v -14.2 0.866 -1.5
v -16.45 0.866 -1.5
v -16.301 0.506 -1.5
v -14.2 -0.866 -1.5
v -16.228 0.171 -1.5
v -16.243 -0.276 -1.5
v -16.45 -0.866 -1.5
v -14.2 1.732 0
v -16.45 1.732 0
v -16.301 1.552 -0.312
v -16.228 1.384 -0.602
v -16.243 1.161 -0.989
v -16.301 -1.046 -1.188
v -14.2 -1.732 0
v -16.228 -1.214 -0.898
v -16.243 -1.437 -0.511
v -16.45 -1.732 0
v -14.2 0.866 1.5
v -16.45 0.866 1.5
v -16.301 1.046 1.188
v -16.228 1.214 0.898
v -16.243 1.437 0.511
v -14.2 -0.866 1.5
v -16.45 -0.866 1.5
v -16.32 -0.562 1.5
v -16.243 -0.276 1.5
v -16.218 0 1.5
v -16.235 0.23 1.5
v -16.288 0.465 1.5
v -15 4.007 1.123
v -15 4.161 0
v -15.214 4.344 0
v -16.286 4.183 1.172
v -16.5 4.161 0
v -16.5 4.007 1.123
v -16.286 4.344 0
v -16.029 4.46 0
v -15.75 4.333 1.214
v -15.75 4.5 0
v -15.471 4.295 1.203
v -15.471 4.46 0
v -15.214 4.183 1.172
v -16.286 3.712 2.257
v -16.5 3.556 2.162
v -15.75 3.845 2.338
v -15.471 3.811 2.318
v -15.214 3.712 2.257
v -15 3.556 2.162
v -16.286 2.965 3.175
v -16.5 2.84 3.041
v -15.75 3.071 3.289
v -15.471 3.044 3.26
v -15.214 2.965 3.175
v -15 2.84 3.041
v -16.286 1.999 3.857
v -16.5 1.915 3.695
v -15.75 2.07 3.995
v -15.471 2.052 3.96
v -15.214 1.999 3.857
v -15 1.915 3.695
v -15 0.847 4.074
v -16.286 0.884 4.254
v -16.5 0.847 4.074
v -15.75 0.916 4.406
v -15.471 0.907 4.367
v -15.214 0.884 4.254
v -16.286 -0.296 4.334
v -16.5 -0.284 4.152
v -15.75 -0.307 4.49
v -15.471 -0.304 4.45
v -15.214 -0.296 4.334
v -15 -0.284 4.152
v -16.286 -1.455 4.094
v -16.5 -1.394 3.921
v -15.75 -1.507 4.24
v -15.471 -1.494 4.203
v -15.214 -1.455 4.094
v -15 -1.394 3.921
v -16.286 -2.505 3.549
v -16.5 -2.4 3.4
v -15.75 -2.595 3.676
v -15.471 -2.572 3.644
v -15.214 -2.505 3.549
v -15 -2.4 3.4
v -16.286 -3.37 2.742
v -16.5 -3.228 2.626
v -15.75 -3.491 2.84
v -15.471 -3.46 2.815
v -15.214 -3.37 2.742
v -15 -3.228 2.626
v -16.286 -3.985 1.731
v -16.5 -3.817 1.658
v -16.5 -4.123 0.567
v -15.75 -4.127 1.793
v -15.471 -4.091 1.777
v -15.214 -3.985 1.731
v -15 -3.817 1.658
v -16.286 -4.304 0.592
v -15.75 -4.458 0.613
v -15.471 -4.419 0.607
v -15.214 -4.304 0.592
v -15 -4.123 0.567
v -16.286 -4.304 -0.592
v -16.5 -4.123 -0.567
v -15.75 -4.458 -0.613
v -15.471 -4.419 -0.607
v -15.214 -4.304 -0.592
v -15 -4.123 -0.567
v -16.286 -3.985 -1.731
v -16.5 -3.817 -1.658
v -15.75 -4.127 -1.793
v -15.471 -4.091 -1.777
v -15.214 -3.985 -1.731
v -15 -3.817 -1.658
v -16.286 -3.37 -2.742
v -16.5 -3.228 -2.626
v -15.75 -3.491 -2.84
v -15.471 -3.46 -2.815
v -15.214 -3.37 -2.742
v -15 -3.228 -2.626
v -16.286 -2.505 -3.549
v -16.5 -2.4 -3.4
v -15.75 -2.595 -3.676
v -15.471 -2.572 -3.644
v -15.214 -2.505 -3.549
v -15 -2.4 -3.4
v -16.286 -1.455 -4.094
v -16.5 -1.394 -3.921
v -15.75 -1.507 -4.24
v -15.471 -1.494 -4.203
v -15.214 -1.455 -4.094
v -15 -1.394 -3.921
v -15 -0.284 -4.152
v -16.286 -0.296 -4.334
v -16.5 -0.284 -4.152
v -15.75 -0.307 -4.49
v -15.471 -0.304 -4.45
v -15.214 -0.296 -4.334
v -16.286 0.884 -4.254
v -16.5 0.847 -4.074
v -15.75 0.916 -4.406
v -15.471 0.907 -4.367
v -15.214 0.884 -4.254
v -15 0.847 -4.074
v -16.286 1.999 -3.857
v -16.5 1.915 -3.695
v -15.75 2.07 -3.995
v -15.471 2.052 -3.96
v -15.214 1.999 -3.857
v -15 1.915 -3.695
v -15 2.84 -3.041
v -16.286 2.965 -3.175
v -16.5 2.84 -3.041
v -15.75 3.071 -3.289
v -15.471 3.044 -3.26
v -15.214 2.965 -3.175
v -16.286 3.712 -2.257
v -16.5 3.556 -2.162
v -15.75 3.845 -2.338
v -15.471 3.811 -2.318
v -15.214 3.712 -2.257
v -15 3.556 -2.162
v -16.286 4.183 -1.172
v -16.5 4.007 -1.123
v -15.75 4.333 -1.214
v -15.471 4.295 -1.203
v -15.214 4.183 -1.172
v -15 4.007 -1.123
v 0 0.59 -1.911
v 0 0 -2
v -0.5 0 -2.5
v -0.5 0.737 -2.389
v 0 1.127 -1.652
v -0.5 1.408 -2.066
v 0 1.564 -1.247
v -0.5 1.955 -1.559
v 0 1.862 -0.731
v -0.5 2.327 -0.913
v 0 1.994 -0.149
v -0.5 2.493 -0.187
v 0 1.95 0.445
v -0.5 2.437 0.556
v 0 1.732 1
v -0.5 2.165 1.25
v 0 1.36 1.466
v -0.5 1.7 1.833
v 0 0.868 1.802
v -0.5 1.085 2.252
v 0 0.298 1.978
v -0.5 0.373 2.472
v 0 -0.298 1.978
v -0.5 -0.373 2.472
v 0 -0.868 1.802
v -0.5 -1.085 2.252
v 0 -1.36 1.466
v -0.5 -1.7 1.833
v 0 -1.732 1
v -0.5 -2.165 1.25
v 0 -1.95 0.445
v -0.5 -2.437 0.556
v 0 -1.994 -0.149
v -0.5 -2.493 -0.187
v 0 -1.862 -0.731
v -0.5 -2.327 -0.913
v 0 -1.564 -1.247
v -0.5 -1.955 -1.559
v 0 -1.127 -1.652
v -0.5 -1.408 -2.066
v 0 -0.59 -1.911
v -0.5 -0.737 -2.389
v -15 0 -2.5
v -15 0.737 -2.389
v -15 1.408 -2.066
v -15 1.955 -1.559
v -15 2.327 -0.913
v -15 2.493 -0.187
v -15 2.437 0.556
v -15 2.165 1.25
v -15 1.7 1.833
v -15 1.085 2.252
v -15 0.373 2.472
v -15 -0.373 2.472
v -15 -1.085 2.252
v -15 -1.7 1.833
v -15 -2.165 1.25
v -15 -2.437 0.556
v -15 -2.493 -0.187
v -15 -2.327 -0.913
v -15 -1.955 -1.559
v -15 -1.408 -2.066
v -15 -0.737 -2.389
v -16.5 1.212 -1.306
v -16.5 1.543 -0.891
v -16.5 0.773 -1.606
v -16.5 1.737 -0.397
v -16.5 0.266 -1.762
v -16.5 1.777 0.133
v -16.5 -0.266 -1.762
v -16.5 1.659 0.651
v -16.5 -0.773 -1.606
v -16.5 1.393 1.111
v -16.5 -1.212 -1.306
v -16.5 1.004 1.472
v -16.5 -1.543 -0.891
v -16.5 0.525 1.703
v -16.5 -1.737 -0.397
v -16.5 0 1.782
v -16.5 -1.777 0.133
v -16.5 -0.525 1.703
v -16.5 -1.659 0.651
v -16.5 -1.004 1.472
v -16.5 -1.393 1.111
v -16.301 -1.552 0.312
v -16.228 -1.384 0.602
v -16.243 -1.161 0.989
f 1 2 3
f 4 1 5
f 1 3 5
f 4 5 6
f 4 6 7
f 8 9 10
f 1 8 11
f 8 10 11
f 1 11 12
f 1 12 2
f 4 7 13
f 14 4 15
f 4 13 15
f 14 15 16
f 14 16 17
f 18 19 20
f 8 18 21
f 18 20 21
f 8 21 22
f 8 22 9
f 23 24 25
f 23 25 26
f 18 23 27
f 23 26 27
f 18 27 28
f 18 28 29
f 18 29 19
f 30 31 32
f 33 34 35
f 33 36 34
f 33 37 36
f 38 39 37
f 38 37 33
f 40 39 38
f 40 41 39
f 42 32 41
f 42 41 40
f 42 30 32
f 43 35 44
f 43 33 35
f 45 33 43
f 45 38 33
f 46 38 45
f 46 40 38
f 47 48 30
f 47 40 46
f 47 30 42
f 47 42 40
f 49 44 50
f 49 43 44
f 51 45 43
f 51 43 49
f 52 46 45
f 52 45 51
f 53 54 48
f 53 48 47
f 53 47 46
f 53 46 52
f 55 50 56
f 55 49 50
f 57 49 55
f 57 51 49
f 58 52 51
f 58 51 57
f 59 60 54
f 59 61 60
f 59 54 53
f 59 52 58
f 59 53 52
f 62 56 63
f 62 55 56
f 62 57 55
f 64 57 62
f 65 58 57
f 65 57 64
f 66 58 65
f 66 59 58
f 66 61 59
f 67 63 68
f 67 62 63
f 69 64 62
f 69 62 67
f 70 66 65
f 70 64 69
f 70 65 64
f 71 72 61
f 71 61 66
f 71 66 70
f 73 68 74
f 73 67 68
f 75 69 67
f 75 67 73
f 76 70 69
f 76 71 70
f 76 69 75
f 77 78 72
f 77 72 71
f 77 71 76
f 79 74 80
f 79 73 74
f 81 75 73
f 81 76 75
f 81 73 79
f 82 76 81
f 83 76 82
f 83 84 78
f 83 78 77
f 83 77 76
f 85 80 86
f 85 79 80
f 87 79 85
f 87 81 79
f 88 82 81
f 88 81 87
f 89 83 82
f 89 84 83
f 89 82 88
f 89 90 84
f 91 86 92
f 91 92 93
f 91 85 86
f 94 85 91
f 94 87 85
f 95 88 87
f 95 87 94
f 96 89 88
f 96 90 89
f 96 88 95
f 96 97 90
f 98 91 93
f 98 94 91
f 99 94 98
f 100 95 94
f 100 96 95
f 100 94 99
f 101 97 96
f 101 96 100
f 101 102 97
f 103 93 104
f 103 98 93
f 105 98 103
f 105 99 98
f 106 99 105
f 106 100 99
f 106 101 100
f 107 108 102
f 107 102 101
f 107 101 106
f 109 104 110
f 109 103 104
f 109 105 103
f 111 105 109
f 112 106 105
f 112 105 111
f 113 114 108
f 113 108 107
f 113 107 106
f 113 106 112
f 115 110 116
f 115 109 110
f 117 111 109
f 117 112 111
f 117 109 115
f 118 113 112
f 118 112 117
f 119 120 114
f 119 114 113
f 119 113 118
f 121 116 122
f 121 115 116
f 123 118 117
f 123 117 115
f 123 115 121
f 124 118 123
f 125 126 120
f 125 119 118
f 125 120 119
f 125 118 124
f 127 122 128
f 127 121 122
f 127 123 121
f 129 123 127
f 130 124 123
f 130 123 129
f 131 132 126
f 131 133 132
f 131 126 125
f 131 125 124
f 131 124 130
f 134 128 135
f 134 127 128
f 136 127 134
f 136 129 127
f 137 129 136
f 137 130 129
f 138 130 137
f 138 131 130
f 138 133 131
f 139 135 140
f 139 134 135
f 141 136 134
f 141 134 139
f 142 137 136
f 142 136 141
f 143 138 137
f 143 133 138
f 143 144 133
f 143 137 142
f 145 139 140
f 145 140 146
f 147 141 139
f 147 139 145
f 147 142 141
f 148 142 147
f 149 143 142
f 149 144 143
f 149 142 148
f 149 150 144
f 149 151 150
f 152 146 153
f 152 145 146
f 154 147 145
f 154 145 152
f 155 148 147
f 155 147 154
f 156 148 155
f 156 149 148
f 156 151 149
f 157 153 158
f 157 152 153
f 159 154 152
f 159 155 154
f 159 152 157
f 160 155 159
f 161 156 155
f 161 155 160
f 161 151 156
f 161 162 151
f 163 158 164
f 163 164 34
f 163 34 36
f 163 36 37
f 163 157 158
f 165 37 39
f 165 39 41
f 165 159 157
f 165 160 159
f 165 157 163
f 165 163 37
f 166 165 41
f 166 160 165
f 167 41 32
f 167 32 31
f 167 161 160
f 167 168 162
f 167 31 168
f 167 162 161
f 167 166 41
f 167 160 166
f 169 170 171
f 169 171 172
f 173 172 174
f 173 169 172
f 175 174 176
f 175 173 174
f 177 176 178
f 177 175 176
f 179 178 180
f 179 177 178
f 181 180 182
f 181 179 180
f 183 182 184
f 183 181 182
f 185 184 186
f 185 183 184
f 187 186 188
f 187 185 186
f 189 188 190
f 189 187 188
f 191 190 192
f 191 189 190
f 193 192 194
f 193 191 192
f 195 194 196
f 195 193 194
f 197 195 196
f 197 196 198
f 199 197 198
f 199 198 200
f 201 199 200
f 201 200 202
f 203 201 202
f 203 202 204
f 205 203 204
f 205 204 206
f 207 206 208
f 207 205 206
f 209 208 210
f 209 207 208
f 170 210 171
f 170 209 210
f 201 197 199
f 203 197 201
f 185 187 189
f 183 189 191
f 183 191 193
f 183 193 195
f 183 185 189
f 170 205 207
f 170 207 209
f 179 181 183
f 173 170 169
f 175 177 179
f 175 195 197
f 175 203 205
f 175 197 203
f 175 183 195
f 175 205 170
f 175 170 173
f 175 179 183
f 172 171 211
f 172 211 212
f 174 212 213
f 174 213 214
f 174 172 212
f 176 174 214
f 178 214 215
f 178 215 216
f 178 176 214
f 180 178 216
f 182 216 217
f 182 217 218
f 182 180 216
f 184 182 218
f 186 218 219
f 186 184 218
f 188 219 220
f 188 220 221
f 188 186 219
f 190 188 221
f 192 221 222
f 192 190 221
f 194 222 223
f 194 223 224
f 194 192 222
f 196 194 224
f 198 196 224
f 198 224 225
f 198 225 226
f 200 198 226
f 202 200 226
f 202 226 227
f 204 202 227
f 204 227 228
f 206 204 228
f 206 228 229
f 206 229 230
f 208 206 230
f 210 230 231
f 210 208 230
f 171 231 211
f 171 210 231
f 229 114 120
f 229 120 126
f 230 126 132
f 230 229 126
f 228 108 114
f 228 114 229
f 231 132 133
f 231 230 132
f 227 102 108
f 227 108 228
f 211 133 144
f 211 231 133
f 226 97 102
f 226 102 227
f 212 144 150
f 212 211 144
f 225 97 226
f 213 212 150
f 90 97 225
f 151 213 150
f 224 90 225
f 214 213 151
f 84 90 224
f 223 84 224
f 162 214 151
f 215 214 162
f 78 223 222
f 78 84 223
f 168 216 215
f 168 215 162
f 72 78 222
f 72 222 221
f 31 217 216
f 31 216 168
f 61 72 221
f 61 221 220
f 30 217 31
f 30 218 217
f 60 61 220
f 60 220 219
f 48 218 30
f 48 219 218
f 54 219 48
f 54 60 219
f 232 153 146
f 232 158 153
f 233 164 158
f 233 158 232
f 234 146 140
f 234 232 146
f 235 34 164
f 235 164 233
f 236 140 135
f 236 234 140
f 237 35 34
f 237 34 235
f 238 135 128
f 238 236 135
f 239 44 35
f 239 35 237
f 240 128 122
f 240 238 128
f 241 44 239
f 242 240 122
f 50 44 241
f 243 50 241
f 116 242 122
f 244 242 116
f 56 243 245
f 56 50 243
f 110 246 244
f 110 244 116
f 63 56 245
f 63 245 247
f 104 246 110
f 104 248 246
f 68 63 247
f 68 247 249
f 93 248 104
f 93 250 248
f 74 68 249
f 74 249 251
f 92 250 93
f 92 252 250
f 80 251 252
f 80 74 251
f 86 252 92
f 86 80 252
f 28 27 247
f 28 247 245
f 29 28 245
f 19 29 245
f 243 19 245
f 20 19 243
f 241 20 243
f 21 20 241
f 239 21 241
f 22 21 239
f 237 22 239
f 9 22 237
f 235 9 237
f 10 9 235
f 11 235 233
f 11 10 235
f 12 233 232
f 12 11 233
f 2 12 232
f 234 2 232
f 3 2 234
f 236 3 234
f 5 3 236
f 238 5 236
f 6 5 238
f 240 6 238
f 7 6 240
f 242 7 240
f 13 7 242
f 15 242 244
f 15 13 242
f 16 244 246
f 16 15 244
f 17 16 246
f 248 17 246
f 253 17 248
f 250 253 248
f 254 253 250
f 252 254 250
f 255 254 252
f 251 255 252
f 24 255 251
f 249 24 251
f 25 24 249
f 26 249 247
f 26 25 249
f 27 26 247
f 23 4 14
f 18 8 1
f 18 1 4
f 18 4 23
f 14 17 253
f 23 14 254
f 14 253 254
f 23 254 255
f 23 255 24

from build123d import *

# Parameters (mm, degrees)
SKETCH2_R           = 2.5
BOSS_EXTRUDE1_DEPTH = 15
CHAMFER1_SIZE       = 0.5
CUT_EXTRUDE1_DEPTH  = 2.3
SKETCH8_R           = 1.782050808
CUT_EXTRUDE2_DEPTH  = 1
CUT_EXTRUDE2_TAPER  = 45


with BuildPart() as part:
    # Sketch2 → Boss-Extrude1 (new body)
    with BuildSketch(Plane(origin=(0, 0, 0), x_dir=(0, 0, -1), z_dir=(1, 0, 0))):
        Circle(SKETCH2_R)
    extrude(amount=-BOSS_EXTRUDE1_DEPTH)

    # Chamfer1
    chamfer1_edges = [part.edges().sort_by_distance(p)[0] for p in [
        (0, 0, 2.5),
    ]]
    chamfer(chamfer1_edges, length=CHAMFER1_SIZE)

    # Sketch6 → Revolve1 (revolve)
    with BuildSketch(Plane.XY):
        with BuildLine():
            Line((-16.5, 0), (-16.5, 4.161437828))
            ThreePointArc((-16.5, 4.161437828), (-15.75, 4.5), (-15, 4.161437828))
            Line((-15, 4.161437828), (-15, 0))
            Line((-15, 0), (-16.5, 0))
        make_face()
    revolve(axis=Axis((-15, 0, 0), (1, 0, 0)))

    # Sketch7 → Cut-Extrude1 (cut)
    with BuildSketch(Plane.ZY.offset(16.5)):
        Polygon((0, 1.732050808), (-1.5, 0.866025404), (-1.5, -0.866025404), (0, -1.732050808), (1.5, -0.866025404), (1.5, 0.866025404), align=None)
    extrude(amount=-CUT_EXTRUDE1_DEPTH, mode=Mode.SUBTRACT)

    # Sketch8 → Cut-Extrude2 (cut)
    with BuildSketch(Plane.ZY.offset(16.5)):
        Circle(SKETCH8_R)
    extrude(amount=-CUT_EXTRUDE2_DEPTH, taper=CUT_EXTRUDE2_TAPER, mode=Mode.SUBTRACT)


solid = part.part
